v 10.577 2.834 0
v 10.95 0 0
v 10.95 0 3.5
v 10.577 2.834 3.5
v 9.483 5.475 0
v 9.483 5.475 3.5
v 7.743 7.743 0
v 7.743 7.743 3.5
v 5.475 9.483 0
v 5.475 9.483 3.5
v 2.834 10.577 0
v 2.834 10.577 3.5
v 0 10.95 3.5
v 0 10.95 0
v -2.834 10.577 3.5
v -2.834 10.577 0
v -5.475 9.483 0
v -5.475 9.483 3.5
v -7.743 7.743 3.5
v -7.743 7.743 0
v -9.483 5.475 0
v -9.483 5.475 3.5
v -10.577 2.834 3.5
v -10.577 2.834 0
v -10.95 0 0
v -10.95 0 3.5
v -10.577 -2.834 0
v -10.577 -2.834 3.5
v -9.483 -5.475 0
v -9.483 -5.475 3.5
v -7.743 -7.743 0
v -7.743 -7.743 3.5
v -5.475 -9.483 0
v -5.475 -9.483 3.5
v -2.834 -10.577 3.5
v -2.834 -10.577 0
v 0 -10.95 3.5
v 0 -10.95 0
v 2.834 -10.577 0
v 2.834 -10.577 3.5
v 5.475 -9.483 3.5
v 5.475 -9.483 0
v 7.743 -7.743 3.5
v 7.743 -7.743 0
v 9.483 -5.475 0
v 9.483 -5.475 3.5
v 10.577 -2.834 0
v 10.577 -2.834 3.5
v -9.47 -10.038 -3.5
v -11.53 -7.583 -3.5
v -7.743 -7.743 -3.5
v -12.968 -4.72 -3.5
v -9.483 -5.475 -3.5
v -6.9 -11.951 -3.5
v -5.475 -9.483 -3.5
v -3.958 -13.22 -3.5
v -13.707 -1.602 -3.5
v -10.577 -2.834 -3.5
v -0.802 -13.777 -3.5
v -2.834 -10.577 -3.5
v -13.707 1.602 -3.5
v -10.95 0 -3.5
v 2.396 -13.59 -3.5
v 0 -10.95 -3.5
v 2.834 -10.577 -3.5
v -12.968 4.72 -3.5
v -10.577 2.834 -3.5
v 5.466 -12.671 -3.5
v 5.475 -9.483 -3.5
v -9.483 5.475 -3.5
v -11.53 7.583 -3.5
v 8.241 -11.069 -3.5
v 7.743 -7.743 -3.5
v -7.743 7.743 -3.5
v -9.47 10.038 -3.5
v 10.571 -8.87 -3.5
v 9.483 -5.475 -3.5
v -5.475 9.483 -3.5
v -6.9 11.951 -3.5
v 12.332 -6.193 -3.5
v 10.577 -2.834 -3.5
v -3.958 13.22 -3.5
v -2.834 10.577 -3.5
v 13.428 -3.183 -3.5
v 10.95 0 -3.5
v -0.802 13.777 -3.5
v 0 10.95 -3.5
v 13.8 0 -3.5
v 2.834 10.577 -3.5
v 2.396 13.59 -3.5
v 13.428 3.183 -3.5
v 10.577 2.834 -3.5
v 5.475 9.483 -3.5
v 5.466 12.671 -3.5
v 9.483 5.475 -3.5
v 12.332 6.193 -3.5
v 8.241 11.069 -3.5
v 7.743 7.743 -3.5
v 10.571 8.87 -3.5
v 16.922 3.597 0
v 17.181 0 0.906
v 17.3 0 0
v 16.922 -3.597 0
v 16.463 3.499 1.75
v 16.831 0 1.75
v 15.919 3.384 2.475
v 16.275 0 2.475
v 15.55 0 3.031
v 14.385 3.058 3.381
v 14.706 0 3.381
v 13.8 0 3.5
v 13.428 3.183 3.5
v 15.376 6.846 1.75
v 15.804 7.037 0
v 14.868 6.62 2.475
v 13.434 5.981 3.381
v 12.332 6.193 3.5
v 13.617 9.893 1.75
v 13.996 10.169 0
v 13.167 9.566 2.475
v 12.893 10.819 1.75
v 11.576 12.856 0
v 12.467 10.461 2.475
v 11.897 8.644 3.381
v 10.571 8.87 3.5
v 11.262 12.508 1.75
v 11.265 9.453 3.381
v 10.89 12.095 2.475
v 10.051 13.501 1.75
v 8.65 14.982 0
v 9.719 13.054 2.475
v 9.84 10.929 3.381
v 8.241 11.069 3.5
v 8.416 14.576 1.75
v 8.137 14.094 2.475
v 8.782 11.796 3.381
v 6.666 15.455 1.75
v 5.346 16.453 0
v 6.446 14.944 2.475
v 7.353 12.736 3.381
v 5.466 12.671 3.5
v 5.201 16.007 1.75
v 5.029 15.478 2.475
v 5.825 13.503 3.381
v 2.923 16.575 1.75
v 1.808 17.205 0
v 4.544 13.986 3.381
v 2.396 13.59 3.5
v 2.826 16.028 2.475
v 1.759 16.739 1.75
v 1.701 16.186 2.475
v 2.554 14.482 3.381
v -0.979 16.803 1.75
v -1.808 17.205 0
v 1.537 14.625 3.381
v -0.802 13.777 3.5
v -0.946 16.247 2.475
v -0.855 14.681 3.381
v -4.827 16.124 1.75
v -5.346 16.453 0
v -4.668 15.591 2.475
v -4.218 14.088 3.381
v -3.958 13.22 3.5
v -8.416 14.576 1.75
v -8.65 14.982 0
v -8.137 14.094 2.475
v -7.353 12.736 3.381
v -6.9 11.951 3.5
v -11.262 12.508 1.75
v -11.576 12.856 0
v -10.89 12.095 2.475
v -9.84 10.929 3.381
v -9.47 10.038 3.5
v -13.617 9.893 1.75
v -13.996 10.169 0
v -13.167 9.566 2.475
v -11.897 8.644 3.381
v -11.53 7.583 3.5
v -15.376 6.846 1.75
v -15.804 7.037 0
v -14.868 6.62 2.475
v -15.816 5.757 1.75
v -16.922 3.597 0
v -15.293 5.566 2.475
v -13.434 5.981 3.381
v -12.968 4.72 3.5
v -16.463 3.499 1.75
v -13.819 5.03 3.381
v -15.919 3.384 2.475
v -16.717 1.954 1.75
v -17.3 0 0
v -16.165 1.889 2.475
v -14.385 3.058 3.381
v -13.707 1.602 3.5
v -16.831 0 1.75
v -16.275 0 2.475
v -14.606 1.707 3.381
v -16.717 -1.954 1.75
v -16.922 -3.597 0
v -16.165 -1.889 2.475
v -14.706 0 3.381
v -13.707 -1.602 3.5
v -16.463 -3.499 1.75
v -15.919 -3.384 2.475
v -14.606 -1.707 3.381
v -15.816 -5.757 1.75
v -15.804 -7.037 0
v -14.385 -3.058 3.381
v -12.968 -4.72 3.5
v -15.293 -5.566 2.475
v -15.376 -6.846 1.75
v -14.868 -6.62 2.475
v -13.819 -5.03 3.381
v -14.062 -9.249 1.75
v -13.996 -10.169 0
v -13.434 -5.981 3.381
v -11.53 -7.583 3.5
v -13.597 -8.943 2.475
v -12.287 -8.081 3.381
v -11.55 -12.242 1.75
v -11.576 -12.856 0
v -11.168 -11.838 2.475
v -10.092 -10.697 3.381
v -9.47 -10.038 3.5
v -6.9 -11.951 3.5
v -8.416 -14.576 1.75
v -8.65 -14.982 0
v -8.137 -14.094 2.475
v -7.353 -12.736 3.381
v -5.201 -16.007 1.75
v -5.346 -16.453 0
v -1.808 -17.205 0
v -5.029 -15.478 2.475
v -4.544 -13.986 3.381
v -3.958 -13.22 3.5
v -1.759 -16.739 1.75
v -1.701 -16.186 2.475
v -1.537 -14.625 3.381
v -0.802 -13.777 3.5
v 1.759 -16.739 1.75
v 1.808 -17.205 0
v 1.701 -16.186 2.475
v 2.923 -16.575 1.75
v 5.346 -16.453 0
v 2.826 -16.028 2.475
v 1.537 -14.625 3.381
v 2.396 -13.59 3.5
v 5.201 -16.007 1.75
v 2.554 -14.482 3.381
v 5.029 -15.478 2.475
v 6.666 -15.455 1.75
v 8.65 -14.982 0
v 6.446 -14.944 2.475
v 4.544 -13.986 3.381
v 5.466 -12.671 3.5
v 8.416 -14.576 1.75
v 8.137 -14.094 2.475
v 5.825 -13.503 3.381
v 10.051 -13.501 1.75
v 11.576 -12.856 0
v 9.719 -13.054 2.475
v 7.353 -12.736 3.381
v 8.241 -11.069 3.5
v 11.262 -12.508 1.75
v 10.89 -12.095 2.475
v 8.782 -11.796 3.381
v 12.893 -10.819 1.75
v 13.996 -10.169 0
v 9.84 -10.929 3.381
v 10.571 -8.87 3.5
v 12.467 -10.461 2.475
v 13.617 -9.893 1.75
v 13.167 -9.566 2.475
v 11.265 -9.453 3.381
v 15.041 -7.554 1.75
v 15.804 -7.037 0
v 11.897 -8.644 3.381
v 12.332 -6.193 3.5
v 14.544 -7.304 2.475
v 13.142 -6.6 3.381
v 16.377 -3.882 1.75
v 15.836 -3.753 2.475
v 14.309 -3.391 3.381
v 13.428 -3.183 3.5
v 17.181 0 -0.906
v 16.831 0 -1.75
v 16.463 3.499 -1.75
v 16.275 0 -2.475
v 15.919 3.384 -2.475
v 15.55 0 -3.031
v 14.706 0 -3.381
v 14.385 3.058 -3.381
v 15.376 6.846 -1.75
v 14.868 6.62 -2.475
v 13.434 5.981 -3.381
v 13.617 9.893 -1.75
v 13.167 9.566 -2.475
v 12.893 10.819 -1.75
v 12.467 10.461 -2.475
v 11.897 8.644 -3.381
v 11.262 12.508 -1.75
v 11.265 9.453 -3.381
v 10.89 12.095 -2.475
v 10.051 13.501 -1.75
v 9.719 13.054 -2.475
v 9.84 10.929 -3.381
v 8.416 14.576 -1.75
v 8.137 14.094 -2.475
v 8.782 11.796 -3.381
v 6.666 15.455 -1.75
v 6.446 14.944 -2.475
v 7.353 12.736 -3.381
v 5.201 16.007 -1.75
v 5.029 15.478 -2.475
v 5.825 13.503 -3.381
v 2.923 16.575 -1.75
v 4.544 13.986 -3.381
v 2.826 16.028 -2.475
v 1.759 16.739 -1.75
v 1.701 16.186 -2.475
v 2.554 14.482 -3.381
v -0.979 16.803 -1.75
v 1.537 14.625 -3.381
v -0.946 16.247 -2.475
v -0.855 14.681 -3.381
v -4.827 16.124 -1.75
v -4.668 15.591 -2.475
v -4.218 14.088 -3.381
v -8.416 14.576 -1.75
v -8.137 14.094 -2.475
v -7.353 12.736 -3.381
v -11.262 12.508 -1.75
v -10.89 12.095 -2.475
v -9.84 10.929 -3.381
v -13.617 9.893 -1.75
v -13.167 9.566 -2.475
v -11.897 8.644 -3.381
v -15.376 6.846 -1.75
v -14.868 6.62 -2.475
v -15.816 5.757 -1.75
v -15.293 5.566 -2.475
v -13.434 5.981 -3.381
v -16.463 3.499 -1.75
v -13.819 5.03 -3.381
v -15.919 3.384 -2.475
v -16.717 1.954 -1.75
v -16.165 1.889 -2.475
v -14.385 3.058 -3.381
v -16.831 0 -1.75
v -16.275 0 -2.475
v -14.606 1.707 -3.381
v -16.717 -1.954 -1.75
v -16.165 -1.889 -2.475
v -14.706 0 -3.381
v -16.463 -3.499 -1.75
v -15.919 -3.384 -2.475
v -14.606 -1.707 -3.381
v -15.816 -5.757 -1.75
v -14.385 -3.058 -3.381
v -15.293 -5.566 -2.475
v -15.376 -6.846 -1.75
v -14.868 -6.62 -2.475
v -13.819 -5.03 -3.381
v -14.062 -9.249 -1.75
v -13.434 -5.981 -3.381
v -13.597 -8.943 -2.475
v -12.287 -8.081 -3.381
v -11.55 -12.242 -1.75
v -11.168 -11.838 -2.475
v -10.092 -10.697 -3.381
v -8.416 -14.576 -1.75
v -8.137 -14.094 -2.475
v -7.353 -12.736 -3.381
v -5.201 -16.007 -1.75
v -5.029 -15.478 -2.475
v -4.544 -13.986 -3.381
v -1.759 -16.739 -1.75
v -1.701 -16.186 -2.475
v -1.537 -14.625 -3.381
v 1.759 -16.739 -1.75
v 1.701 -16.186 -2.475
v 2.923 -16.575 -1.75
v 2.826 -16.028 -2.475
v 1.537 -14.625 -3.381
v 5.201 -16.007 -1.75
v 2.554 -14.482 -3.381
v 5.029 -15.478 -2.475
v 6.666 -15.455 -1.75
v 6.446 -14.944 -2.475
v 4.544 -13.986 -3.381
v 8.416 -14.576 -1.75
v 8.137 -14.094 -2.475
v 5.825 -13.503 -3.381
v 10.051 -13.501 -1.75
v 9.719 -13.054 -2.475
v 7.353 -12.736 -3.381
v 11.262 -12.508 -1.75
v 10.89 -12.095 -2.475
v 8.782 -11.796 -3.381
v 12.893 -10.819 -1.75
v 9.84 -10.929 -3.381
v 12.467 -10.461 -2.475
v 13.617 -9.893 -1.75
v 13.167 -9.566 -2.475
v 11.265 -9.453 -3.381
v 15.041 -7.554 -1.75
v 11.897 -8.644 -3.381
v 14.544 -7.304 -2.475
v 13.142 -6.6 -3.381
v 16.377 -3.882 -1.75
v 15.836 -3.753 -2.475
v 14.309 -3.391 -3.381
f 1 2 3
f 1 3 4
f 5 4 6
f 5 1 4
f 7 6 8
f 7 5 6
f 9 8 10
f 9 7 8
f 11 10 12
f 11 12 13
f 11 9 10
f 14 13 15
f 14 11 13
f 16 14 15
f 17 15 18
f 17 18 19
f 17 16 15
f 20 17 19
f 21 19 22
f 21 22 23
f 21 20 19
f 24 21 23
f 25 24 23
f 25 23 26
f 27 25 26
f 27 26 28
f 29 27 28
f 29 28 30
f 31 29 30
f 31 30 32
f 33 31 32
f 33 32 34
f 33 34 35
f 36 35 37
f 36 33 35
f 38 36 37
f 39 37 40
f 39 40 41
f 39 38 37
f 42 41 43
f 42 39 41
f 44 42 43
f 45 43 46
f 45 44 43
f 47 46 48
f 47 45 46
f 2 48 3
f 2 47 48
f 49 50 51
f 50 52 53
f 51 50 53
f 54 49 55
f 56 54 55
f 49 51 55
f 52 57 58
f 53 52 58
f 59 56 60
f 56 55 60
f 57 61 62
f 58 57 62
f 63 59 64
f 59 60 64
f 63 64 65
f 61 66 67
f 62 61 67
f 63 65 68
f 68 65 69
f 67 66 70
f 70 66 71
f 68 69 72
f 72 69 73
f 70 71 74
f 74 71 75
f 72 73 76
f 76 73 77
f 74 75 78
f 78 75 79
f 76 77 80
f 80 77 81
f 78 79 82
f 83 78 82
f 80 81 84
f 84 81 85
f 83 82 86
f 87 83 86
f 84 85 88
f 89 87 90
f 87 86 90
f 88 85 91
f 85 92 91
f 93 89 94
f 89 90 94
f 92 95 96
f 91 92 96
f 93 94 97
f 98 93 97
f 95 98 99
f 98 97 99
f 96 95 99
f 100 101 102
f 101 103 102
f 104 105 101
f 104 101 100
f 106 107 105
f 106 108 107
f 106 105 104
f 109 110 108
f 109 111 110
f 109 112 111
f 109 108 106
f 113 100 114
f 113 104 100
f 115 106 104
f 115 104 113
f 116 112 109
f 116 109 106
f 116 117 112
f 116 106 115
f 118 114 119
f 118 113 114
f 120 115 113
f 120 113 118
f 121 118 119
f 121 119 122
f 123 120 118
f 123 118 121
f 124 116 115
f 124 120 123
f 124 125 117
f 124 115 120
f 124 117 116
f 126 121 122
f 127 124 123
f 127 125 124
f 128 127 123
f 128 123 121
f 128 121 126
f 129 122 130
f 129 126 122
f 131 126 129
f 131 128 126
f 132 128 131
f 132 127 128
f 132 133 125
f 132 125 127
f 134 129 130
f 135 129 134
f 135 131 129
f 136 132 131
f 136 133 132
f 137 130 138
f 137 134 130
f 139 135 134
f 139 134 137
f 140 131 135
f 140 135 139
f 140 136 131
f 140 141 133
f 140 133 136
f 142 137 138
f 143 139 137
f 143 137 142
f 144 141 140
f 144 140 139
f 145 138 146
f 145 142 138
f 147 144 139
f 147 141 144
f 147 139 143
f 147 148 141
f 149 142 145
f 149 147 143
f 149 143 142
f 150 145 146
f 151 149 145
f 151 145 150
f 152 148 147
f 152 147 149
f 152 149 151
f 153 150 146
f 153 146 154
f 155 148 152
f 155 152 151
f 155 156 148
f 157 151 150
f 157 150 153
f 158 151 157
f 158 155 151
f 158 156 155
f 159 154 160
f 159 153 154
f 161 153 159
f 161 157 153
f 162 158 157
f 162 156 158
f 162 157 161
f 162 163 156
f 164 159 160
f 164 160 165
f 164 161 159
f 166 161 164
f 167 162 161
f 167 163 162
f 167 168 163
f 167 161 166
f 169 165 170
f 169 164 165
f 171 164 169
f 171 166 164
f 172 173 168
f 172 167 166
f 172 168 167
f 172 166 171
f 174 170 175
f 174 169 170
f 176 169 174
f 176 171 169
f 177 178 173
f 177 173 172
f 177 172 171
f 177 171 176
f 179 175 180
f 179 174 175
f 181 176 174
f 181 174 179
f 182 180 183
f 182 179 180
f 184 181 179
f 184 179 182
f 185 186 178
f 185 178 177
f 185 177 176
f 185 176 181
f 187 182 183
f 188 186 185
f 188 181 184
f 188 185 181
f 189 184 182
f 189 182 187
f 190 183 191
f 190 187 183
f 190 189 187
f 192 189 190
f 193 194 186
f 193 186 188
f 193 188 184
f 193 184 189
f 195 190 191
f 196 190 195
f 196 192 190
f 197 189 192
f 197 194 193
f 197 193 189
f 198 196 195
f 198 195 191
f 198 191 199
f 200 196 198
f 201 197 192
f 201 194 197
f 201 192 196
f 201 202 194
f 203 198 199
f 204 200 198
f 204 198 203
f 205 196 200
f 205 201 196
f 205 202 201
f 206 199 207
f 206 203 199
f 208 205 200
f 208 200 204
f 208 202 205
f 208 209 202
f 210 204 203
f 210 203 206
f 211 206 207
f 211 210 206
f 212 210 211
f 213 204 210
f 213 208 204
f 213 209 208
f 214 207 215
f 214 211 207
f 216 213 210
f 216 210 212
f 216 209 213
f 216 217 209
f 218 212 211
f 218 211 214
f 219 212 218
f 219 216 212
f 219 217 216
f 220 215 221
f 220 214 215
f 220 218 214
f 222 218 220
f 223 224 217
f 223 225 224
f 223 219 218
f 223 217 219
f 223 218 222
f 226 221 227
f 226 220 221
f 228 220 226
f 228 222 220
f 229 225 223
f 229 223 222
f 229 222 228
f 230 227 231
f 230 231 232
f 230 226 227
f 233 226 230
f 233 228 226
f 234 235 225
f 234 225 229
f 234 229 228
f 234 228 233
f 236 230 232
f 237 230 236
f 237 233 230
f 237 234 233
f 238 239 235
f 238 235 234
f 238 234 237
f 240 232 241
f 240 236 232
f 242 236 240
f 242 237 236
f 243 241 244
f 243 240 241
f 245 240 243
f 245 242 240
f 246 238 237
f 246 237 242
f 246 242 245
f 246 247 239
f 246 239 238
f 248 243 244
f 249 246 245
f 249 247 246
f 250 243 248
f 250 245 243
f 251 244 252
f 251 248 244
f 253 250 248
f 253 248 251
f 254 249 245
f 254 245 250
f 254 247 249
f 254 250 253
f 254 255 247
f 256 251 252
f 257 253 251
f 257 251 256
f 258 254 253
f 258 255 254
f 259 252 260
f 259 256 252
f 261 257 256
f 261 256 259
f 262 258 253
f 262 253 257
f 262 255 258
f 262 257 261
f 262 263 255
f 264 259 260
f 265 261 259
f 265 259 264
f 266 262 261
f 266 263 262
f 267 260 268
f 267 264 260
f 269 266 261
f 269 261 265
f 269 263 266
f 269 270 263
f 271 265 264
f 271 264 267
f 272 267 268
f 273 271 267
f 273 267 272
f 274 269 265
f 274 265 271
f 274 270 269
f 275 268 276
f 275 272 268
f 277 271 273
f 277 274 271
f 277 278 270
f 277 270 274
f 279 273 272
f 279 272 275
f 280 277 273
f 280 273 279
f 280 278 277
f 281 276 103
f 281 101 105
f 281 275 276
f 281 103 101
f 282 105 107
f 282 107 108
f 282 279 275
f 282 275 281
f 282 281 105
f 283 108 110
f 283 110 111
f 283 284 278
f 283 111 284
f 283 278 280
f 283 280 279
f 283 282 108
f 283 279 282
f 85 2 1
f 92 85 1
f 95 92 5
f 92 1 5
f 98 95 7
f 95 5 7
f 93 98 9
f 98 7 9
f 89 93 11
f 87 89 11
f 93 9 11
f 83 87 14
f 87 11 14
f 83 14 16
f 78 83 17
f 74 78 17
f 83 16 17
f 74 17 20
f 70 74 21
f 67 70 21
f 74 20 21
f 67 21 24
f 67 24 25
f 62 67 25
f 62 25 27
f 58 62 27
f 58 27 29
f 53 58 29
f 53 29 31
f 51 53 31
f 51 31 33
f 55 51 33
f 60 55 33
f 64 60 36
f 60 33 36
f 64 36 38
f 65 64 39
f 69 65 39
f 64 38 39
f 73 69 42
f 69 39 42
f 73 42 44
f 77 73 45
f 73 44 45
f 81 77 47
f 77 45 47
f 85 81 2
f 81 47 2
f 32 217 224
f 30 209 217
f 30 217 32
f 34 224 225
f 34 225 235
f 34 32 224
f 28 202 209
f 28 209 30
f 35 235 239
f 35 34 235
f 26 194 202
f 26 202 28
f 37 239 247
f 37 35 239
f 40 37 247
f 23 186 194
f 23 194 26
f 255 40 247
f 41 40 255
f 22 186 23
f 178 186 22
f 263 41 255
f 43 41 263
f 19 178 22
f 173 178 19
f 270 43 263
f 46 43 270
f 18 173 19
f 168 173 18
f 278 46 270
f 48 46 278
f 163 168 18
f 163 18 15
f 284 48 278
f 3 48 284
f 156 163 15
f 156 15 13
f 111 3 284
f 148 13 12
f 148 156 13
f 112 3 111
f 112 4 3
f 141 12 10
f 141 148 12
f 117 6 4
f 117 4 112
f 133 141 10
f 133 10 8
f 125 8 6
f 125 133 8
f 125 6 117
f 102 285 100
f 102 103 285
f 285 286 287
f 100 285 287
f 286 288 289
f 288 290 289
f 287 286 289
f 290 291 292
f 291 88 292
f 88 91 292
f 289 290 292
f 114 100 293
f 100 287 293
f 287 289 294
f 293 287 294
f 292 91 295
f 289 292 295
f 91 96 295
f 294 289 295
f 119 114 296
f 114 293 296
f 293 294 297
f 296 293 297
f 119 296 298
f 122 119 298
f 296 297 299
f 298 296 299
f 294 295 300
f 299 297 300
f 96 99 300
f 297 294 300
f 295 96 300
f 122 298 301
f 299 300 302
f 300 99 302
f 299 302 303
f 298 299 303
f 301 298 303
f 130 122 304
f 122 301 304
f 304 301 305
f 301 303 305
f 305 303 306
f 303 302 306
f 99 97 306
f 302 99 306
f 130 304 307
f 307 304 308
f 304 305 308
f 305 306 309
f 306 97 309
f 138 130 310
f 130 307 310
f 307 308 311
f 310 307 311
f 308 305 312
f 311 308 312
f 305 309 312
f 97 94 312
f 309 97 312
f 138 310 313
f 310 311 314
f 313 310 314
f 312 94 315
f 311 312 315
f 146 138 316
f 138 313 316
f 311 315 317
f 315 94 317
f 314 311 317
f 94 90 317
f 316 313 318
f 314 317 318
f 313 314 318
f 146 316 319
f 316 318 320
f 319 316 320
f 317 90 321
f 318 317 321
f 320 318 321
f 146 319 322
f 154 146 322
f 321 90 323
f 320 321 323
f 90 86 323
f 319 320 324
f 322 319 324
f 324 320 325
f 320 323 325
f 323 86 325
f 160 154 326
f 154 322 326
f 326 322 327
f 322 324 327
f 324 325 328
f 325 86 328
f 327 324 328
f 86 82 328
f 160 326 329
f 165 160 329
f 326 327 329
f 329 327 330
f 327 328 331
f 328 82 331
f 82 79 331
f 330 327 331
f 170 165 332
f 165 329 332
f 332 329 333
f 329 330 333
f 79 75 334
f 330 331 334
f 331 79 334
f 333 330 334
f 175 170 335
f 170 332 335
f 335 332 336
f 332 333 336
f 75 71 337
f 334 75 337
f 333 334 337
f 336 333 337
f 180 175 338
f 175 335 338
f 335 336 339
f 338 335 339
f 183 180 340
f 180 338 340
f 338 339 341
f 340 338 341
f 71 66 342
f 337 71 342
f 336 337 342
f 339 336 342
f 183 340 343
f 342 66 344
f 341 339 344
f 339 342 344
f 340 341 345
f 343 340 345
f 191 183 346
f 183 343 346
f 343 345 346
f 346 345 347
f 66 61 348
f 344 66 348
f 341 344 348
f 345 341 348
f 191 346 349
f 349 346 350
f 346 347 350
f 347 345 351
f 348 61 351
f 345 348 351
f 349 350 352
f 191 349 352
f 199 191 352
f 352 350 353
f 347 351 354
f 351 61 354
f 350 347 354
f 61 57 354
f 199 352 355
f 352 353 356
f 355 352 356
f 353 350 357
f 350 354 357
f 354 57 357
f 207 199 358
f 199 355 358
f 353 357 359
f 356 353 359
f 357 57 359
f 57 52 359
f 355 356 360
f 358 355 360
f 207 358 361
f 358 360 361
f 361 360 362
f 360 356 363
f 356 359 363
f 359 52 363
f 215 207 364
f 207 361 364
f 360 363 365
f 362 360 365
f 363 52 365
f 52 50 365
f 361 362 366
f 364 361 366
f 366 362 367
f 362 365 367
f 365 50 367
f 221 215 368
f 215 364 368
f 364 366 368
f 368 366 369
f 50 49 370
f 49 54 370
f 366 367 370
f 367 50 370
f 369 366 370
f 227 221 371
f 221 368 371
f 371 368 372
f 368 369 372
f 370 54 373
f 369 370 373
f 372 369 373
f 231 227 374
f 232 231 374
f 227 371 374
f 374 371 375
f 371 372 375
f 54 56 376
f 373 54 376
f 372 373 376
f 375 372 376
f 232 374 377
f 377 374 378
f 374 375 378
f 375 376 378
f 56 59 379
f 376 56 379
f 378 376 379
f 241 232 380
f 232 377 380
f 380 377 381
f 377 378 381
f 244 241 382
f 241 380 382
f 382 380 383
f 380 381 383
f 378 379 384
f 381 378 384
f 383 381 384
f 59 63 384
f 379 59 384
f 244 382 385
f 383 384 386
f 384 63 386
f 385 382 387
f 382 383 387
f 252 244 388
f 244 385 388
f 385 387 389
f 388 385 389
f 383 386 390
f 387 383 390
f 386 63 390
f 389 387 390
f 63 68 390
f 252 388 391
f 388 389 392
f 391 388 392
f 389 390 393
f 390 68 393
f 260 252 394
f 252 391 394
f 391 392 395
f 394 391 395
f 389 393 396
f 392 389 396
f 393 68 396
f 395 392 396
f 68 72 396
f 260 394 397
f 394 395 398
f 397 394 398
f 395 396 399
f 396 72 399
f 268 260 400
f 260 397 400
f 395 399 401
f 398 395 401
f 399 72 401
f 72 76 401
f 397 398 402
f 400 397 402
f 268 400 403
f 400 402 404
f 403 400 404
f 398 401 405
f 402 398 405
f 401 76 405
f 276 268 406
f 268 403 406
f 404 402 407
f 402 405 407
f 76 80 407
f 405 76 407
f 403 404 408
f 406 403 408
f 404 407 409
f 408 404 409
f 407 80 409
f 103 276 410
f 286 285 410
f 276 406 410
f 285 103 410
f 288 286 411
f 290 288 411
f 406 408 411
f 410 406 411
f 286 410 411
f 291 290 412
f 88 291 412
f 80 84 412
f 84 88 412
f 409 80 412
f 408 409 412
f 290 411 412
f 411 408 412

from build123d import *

# Parameters (mm, degrees)
F0_R     = 17.3
F0_R_2   = 10.95
F1_DEPTH = 3.5
F2_DEPTH = 3.5
F3_R     = 3.49999
F4_R     = 3.49999


# Not quite as in the source:
# - a fillet or chamfer is up to 0.001 mm smaller than in the source, because OpenCascade refuses the exact size


with BuildPart() as f1:
    # F0 (on Top) → F1 (new body)
    with BuildSketch(Plane.XY):
        Circle(F0_R)
        Circle(F0_R_2, mode=Mode.SUBTRACT)
    extrude(amount=F1_DEPTH)

    # F2 (add): a face of the model
    f2_faces = [f1.faces().sort_by_distance(p)[0] for p in [
        (-16.8106821074, 0, 0),
    ]]
    extrude(f2_faces, amount=F2_DEPTH)

    # F3 (radius 3.5 in the source; OpenCascade refuses exactly that, so slightly less here)
    f3_edges = [f1.edges().sort_by_distance(p)[0] for p in [
        (-17.3, 0, 3.5),
    ]]
    fillet(f3_edges, radius=F3_R)

    # F4 (radius 3.5 in the source; OpenCascade refuses exactly that, so slightly less here)
    f4_edges = [f1.edges().sort_by_distance(p)[0] for p in [
        (-17.3, 0, -3.5),
    ]]
    fillet(f4_edges, radius=F4_R)


solid = f1.part
